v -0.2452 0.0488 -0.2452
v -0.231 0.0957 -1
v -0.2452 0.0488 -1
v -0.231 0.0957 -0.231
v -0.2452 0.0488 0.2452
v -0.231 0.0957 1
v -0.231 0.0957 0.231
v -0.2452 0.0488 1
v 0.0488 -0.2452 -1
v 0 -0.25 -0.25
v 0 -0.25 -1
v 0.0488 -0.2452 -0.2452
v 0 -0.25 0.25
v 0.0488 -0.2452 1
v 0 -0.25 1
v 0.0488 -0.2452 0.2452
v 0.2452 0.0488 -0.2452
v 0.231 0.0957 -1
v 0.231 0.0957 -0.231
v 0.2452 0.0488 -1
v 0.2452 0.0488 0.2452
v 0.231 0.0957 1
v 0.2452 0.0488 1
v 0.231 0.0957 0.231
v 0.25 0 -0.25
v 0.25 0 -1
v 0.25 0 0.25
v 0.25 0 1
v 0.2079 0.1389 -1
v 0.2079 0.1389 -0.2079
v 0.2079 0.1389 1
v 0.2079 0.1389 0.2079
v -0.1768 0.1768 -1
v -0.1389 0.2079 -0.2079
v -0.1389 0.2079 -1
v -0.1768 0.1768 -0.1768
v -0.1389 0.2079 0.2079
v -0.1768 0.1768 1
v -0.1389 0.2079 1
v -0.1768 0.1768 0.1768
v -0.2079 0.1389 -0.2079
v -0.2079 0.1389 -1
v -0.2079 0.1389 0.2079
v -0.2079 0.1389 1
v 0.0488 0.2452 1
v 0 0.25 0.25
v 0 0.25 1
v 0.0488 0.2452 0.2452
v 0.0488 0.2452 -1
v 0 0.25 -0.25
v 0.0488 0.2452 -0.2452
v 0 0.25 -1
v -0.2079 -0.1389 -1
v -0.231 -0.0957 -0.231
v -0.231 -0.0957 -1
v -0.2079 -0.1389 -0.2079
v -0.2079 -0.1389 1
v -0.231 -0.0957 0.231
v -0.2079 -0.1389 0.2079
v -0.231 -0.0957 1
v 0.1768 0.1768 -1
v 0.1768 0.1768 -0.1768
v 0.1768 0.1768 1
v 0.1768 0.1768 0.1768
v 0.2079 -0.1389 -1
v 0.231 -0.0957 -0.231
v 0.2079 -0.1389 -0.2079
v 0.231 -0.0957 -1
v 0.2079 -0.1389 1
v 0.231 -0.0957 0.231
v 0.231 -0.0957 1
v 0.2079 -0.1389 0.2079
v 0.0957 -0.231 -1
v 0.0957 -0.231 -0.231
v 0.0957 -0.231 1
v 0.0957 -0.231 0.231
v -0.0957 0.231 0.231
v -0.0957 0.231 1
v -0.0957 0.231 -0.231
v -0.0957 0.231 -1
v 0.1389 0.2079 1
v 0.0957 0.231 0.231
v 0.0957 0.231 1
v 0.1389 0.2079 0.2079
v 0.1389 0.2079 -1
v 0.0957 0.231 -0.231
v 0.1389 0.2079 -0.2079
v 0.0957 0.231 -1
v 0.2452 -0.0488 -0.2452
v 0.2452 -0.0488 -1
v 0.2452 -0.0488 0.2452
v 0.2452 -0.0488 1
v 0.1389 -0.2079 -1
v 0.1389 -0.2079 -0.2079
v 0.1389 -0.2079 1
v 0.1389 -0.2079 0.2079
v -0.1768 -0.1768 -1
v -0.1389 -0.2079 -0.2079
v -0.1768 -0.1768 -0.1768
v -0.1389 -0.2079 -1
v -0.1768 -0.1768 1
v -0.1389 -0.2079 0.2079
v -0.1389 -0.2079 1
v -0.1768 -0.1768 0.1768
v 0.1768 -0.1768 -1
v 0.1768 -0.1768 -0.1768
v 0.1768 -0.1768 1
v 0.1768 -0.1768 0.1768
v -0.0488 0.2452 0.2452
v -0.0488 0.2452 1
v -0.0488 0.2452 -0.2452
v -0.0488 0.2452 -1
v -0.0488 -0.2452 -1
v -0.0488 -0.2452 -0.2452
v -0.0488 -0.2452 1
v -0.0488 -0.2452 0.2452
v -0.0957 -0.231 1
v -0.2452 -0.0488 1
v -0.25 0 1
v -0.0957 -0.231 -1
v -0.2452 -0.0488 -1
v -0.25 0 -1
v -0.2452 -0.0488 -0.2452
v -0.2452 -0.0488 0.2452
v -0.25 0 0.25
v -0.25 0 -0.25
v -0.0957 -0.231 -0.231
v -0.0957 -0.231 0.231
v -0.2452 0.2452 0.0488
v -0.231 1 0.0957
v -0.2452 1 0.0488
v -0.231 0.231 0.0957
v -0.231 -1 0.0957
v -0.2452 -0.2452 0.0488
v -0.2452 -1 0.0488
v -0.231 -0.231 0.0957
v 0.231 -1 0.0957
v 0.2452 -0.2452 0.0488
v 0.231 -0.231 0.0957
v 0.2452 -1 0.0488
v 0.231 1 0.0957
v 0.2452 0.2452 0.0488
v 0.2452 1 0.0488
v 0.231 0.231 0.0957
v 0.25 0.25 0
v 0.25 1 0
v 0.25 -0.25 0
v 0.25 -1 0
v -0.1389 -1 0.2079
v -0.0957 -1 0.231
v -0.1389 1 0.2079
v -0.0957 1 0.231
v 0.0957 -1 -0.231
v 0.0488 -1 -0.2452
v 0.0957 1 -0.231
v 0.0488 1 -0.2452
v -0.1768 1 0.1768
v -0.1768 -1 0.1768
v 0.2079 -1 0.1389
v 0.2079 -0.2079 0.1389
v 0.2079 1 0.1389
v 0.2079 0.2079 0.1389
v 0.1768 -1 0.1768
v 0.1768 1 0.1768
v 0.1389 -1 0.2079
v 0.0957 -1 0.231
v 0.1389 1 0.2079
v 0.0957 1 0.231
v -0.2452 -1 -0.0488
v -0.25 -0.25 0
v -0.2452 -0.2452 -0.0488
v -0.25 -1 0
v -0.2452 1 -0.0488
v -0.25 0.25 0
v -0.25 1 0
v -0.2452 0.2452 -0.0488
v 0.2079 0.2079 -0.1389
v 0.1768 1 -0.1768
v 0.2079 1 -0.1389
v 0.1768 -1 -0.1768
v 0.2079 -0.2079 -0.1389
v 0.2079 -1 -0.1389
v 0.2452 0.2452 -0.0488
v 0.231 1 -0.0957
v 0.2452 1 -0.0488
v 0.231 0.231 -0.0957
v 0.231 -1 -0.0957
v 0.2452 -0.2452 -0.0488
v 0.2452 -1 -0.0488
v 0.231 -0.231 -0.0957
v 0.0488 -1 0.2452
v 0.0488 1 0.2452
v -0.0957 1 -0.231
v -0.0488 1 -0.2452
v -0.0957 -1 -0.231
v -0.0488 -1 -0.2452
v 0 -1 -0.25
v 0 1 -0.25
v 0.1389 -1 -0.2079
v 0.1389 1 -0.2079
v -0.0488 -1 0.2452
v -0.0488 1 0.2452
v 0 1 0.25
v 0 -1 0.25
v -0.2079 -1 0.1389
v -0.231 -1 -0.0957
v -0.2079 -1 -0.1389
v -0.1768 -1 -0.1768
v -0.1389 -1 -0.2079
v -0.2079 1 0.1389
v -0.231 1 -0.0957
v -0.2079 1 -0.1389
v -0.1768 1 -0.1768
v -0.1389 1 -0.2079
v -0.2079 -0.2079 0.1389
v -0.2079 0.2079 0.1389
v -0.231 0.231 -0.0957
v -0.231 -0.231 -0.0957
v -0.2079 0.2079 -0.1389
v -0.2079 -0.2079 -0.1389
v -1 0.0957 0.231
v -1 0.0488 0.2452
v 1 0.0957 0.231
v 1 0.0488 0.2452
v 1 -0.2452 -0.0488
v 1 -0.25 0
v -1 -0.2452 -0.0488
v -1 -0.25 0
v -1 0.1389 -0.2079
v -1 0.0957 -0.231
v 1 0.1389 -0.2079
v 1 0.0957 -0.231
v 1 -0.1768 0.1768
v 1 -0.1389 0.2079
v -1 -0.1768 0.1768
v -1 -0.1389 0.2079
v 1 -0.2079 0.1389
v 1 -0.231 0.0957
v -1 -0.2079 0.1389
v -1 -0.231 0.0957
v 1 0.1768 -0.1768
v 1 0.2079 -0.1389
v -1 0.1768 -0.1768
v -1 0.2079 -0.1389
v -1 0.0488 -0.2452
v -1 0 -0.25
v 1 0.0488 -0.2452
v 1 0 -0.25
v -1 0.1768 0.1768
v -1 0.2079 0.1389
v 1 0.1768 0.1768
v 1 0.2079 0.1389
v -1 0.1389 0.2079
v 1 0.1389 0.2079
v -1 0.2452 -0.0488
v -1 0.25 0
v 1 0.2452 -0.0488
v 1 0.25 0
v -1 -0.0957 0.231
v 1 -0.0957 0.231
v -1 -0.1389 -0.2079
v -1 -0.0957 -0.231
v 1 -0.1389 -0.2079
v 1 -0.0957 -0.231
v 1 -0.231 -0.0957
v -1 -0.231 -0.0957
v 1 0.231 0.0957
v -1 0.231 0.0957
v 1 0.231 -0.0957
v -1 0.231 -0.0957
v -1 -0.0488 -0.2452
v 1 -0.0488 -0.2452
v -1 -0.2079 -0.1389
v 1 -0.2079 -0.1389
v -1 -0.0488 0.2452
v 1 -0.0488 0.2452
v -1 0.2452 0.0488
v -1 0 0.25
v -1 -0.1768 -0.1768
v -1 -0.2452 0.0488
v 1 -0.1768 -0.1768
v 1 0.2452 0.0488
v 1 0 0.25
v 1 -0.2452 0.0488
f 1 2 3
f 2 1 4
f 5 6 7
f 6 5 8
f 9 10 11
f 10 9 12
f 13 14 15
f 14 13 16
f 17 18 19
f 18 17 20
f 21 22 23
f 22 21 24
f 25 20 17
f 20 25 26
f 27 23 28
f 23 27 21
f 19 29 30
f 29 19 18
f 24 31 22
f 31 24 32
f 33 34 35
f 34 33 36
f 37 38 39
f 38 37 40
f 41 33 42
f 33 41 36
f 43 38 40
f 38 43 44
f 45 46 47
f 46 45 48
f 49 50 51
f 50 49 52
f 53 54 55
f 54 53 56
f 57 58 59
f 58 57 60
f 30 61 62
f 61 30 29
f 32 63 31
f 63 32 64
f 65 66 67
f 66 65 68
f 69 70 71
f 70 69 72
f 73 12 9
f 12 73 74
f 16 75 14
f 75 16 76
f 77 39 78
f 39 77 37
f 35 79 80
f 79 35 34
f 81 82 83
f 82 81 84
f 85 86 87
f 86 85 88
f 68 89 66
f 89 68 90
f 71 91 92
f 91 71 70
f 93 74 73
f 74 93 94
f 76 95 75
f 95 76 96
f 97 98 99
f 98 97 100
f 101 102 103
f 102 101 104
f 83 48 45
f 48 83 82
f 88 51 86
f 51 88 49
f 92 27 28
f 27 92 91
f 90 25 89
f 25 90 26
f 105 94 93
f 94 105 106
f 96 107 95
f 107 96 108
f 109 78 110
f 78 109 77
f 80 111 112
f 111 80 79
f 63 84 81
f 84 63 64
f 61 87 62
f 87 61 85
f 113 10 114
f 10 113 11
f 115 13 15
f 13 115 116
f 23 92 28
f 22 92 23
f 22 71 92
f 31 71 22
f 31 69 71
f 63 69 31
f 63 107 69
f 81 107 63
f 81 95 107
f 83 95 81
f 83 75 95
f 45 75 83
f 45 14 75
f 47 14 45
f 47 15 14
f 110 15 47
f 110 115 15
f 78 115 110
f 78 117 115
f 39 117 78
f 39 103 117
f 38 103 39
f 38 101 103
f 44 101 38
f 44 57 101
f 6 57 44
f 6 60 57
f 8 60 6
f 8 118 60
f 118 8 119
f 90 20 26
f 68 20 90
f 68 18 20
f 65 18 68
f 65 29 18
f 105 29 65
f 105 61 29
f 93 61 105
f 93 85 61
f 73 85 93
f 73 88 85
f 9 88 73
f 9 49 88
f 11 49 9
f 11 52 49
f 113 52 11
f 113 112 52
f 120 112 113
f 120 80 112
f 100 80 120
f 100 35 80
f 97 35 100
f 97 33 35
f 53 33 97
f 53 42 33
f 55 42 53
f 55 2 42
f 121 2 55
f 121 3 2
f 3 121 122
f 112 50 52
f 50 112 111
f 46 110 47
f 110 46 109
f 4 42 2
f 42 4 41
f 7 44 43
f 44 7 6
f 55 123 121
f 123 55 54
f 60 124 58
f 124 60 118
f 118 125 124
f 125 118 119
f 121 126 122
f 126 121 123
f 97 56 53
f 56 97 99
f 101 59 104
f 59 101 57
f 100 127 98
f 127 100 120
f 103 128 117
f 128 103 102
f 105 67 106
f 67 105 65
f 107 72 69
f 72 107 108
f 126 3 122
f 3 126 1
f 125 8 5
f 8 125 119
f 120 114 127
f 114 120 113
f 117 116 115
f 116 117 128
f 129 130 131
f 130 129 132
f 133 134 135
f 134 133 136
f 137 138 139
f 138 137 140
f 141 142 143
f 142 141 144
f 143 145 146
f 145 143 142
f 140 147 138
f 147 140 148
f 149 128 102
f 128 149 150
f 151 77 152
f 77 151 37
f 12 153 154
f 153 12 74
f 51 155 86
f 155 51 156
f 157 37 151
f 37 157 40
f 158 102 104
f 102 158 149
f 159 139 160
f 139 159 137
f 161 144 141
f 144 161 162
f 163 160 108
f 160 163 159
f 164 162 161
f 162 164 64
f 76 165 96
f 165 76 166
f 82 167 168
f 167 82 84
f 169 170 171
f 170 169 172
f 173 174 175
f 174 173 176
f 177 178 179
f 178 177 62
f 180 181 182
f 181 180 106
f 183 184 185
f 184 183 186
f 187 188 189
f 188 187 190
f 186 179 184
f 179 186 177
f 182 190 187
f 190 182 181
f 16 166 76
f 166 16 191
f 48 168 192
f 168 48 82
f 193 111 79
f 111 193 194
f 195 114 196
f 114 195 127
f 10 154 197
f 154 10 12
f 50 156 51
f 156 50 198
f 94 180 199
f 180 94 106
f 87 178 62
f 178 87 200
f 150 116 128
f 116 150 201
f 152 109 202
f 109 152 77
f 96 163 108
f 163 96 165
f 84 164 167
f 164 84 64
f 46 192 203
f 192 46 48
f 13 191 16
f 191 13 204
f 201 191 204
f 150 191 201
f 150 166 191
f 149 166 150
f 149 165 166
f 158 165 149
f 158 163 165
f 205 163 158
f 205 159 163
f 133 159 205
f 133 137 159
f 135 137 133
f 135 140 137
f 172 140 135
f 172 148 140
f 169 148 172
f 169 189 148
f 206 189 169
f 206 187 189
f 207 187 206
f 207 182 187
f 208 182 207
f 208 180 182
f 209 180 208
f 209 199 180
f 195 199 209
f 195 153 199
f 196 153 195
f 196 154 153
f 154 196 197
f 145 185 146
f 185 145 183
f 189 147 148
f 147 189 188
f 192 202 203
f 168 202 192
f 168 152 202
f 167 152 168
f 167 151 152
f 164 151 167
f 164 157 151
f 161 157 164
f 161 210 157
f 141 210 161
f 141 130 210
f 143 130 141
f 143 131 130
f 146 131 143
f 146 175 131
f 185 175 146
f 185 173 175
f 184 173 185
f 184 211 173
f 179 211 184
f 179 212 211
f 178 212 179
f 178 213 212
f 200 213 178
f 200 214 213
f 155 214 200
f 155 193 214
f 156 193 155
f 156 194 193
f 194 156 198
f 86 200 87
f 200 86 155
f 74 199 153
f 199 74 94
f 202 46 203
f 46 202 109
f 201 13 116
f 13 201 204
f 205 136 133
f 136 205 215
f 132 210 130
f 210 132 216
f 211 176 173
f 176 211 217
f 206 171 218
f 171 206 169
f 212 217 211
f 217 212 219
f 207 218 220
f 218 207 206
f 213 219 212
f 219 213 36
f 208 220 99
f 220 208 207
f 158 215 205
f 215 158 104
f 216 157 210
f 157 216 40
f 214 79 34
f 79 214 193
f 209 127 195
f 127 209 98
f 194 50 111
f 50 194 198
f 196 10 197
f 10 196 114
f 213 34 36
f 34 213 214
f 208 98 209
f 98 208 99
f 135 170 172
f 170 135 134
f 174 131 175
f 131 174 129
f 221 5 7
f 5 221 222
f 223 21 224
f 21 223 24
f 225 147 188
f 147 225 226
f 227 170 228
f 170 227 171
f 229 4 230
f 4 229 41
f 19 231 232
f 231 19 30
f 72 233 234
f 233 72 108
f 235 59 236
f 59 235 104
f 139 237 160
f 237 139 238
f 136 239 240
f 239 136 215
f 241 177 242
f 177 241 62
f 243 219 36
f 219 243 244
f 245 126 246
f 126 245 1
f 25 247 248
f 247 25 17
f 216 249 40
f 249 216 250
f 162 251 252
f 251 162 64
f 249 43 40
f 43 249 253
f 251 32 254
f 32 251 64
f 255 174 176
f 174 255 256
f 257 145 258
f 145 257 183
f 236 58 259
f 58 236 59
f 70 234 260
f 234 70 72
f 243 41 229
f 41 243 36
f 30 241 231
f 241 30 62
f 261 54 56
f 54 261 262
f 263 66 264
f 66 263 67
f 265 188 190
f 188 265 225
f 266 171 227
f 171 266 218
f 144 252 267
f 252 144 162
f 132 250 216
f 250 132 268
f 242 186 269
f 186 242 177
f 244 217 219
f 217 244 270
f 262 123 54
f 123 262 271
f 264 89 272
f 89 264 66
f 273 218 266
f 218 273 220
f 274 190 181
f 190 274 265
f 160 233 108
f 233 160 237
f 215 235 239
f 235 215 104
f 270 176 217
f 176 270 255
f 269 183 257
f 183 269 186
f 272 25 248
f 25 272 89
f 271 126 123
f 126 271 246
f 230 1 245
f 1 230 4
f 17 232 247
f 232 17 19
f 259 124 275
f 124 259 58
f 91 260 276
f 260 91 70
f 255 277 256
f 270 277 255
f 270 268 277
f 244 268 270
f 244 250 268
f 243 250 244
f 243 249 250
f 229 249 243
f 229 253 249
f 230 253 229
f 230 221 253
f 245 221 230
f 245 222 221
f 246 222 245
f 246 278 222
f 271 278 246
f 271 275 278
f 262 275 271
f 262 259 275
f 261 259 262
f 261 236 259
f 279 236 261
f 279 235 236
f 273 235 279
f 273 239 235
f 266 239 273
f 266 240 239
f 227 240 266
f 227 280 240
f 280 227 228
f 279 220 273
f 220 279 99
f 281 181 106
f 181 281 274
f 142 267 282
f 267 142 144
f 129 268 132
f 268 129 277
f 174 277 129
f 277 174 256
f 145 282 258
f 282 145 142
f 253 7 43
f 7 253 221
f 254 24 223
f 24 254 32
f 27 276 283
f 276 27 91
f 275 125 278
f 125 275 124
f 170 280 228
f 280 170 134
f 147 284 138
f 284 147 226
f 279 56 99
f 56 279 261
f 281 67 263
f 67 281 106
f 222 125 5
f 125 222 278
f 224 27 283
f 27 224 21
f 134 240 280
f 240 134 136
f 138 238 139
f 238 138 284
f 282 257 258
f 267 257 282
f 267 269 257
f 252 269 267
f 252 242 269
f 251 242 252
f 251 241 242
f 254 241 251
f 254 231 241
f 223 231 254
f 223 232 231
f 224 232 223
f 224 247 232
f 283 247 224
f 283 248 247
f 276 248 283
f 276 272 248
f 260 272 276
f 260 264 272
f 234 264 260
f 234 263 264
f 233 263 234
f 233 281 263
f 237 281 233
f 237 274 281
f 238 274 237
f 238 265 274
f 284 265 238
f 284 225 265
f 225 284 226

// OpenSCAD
module core() {
  union() {
    cylinder(
      r=0.25,
      h=2,
      center=true,
      $fn=32
    );
    rotate([90,0,0])
      cylinder(
        r=0.25,
        h=2,
        center=true,
        $fn=32
      );
    rotate([0,90,0])
      cylinder(
        r=0.25,
        h=2,
        center=true,
        $fn=32
      );
  }
}

module round_cube() {
  intersection() {
    cube(
      [1,1,1],
      center=true
    );
    sphere(
      r=0.6,
      $fn=64,
      center=true
    );
  }
}

module part() {
  difference() {
    round_cube();
    core();
  }
}

core();
